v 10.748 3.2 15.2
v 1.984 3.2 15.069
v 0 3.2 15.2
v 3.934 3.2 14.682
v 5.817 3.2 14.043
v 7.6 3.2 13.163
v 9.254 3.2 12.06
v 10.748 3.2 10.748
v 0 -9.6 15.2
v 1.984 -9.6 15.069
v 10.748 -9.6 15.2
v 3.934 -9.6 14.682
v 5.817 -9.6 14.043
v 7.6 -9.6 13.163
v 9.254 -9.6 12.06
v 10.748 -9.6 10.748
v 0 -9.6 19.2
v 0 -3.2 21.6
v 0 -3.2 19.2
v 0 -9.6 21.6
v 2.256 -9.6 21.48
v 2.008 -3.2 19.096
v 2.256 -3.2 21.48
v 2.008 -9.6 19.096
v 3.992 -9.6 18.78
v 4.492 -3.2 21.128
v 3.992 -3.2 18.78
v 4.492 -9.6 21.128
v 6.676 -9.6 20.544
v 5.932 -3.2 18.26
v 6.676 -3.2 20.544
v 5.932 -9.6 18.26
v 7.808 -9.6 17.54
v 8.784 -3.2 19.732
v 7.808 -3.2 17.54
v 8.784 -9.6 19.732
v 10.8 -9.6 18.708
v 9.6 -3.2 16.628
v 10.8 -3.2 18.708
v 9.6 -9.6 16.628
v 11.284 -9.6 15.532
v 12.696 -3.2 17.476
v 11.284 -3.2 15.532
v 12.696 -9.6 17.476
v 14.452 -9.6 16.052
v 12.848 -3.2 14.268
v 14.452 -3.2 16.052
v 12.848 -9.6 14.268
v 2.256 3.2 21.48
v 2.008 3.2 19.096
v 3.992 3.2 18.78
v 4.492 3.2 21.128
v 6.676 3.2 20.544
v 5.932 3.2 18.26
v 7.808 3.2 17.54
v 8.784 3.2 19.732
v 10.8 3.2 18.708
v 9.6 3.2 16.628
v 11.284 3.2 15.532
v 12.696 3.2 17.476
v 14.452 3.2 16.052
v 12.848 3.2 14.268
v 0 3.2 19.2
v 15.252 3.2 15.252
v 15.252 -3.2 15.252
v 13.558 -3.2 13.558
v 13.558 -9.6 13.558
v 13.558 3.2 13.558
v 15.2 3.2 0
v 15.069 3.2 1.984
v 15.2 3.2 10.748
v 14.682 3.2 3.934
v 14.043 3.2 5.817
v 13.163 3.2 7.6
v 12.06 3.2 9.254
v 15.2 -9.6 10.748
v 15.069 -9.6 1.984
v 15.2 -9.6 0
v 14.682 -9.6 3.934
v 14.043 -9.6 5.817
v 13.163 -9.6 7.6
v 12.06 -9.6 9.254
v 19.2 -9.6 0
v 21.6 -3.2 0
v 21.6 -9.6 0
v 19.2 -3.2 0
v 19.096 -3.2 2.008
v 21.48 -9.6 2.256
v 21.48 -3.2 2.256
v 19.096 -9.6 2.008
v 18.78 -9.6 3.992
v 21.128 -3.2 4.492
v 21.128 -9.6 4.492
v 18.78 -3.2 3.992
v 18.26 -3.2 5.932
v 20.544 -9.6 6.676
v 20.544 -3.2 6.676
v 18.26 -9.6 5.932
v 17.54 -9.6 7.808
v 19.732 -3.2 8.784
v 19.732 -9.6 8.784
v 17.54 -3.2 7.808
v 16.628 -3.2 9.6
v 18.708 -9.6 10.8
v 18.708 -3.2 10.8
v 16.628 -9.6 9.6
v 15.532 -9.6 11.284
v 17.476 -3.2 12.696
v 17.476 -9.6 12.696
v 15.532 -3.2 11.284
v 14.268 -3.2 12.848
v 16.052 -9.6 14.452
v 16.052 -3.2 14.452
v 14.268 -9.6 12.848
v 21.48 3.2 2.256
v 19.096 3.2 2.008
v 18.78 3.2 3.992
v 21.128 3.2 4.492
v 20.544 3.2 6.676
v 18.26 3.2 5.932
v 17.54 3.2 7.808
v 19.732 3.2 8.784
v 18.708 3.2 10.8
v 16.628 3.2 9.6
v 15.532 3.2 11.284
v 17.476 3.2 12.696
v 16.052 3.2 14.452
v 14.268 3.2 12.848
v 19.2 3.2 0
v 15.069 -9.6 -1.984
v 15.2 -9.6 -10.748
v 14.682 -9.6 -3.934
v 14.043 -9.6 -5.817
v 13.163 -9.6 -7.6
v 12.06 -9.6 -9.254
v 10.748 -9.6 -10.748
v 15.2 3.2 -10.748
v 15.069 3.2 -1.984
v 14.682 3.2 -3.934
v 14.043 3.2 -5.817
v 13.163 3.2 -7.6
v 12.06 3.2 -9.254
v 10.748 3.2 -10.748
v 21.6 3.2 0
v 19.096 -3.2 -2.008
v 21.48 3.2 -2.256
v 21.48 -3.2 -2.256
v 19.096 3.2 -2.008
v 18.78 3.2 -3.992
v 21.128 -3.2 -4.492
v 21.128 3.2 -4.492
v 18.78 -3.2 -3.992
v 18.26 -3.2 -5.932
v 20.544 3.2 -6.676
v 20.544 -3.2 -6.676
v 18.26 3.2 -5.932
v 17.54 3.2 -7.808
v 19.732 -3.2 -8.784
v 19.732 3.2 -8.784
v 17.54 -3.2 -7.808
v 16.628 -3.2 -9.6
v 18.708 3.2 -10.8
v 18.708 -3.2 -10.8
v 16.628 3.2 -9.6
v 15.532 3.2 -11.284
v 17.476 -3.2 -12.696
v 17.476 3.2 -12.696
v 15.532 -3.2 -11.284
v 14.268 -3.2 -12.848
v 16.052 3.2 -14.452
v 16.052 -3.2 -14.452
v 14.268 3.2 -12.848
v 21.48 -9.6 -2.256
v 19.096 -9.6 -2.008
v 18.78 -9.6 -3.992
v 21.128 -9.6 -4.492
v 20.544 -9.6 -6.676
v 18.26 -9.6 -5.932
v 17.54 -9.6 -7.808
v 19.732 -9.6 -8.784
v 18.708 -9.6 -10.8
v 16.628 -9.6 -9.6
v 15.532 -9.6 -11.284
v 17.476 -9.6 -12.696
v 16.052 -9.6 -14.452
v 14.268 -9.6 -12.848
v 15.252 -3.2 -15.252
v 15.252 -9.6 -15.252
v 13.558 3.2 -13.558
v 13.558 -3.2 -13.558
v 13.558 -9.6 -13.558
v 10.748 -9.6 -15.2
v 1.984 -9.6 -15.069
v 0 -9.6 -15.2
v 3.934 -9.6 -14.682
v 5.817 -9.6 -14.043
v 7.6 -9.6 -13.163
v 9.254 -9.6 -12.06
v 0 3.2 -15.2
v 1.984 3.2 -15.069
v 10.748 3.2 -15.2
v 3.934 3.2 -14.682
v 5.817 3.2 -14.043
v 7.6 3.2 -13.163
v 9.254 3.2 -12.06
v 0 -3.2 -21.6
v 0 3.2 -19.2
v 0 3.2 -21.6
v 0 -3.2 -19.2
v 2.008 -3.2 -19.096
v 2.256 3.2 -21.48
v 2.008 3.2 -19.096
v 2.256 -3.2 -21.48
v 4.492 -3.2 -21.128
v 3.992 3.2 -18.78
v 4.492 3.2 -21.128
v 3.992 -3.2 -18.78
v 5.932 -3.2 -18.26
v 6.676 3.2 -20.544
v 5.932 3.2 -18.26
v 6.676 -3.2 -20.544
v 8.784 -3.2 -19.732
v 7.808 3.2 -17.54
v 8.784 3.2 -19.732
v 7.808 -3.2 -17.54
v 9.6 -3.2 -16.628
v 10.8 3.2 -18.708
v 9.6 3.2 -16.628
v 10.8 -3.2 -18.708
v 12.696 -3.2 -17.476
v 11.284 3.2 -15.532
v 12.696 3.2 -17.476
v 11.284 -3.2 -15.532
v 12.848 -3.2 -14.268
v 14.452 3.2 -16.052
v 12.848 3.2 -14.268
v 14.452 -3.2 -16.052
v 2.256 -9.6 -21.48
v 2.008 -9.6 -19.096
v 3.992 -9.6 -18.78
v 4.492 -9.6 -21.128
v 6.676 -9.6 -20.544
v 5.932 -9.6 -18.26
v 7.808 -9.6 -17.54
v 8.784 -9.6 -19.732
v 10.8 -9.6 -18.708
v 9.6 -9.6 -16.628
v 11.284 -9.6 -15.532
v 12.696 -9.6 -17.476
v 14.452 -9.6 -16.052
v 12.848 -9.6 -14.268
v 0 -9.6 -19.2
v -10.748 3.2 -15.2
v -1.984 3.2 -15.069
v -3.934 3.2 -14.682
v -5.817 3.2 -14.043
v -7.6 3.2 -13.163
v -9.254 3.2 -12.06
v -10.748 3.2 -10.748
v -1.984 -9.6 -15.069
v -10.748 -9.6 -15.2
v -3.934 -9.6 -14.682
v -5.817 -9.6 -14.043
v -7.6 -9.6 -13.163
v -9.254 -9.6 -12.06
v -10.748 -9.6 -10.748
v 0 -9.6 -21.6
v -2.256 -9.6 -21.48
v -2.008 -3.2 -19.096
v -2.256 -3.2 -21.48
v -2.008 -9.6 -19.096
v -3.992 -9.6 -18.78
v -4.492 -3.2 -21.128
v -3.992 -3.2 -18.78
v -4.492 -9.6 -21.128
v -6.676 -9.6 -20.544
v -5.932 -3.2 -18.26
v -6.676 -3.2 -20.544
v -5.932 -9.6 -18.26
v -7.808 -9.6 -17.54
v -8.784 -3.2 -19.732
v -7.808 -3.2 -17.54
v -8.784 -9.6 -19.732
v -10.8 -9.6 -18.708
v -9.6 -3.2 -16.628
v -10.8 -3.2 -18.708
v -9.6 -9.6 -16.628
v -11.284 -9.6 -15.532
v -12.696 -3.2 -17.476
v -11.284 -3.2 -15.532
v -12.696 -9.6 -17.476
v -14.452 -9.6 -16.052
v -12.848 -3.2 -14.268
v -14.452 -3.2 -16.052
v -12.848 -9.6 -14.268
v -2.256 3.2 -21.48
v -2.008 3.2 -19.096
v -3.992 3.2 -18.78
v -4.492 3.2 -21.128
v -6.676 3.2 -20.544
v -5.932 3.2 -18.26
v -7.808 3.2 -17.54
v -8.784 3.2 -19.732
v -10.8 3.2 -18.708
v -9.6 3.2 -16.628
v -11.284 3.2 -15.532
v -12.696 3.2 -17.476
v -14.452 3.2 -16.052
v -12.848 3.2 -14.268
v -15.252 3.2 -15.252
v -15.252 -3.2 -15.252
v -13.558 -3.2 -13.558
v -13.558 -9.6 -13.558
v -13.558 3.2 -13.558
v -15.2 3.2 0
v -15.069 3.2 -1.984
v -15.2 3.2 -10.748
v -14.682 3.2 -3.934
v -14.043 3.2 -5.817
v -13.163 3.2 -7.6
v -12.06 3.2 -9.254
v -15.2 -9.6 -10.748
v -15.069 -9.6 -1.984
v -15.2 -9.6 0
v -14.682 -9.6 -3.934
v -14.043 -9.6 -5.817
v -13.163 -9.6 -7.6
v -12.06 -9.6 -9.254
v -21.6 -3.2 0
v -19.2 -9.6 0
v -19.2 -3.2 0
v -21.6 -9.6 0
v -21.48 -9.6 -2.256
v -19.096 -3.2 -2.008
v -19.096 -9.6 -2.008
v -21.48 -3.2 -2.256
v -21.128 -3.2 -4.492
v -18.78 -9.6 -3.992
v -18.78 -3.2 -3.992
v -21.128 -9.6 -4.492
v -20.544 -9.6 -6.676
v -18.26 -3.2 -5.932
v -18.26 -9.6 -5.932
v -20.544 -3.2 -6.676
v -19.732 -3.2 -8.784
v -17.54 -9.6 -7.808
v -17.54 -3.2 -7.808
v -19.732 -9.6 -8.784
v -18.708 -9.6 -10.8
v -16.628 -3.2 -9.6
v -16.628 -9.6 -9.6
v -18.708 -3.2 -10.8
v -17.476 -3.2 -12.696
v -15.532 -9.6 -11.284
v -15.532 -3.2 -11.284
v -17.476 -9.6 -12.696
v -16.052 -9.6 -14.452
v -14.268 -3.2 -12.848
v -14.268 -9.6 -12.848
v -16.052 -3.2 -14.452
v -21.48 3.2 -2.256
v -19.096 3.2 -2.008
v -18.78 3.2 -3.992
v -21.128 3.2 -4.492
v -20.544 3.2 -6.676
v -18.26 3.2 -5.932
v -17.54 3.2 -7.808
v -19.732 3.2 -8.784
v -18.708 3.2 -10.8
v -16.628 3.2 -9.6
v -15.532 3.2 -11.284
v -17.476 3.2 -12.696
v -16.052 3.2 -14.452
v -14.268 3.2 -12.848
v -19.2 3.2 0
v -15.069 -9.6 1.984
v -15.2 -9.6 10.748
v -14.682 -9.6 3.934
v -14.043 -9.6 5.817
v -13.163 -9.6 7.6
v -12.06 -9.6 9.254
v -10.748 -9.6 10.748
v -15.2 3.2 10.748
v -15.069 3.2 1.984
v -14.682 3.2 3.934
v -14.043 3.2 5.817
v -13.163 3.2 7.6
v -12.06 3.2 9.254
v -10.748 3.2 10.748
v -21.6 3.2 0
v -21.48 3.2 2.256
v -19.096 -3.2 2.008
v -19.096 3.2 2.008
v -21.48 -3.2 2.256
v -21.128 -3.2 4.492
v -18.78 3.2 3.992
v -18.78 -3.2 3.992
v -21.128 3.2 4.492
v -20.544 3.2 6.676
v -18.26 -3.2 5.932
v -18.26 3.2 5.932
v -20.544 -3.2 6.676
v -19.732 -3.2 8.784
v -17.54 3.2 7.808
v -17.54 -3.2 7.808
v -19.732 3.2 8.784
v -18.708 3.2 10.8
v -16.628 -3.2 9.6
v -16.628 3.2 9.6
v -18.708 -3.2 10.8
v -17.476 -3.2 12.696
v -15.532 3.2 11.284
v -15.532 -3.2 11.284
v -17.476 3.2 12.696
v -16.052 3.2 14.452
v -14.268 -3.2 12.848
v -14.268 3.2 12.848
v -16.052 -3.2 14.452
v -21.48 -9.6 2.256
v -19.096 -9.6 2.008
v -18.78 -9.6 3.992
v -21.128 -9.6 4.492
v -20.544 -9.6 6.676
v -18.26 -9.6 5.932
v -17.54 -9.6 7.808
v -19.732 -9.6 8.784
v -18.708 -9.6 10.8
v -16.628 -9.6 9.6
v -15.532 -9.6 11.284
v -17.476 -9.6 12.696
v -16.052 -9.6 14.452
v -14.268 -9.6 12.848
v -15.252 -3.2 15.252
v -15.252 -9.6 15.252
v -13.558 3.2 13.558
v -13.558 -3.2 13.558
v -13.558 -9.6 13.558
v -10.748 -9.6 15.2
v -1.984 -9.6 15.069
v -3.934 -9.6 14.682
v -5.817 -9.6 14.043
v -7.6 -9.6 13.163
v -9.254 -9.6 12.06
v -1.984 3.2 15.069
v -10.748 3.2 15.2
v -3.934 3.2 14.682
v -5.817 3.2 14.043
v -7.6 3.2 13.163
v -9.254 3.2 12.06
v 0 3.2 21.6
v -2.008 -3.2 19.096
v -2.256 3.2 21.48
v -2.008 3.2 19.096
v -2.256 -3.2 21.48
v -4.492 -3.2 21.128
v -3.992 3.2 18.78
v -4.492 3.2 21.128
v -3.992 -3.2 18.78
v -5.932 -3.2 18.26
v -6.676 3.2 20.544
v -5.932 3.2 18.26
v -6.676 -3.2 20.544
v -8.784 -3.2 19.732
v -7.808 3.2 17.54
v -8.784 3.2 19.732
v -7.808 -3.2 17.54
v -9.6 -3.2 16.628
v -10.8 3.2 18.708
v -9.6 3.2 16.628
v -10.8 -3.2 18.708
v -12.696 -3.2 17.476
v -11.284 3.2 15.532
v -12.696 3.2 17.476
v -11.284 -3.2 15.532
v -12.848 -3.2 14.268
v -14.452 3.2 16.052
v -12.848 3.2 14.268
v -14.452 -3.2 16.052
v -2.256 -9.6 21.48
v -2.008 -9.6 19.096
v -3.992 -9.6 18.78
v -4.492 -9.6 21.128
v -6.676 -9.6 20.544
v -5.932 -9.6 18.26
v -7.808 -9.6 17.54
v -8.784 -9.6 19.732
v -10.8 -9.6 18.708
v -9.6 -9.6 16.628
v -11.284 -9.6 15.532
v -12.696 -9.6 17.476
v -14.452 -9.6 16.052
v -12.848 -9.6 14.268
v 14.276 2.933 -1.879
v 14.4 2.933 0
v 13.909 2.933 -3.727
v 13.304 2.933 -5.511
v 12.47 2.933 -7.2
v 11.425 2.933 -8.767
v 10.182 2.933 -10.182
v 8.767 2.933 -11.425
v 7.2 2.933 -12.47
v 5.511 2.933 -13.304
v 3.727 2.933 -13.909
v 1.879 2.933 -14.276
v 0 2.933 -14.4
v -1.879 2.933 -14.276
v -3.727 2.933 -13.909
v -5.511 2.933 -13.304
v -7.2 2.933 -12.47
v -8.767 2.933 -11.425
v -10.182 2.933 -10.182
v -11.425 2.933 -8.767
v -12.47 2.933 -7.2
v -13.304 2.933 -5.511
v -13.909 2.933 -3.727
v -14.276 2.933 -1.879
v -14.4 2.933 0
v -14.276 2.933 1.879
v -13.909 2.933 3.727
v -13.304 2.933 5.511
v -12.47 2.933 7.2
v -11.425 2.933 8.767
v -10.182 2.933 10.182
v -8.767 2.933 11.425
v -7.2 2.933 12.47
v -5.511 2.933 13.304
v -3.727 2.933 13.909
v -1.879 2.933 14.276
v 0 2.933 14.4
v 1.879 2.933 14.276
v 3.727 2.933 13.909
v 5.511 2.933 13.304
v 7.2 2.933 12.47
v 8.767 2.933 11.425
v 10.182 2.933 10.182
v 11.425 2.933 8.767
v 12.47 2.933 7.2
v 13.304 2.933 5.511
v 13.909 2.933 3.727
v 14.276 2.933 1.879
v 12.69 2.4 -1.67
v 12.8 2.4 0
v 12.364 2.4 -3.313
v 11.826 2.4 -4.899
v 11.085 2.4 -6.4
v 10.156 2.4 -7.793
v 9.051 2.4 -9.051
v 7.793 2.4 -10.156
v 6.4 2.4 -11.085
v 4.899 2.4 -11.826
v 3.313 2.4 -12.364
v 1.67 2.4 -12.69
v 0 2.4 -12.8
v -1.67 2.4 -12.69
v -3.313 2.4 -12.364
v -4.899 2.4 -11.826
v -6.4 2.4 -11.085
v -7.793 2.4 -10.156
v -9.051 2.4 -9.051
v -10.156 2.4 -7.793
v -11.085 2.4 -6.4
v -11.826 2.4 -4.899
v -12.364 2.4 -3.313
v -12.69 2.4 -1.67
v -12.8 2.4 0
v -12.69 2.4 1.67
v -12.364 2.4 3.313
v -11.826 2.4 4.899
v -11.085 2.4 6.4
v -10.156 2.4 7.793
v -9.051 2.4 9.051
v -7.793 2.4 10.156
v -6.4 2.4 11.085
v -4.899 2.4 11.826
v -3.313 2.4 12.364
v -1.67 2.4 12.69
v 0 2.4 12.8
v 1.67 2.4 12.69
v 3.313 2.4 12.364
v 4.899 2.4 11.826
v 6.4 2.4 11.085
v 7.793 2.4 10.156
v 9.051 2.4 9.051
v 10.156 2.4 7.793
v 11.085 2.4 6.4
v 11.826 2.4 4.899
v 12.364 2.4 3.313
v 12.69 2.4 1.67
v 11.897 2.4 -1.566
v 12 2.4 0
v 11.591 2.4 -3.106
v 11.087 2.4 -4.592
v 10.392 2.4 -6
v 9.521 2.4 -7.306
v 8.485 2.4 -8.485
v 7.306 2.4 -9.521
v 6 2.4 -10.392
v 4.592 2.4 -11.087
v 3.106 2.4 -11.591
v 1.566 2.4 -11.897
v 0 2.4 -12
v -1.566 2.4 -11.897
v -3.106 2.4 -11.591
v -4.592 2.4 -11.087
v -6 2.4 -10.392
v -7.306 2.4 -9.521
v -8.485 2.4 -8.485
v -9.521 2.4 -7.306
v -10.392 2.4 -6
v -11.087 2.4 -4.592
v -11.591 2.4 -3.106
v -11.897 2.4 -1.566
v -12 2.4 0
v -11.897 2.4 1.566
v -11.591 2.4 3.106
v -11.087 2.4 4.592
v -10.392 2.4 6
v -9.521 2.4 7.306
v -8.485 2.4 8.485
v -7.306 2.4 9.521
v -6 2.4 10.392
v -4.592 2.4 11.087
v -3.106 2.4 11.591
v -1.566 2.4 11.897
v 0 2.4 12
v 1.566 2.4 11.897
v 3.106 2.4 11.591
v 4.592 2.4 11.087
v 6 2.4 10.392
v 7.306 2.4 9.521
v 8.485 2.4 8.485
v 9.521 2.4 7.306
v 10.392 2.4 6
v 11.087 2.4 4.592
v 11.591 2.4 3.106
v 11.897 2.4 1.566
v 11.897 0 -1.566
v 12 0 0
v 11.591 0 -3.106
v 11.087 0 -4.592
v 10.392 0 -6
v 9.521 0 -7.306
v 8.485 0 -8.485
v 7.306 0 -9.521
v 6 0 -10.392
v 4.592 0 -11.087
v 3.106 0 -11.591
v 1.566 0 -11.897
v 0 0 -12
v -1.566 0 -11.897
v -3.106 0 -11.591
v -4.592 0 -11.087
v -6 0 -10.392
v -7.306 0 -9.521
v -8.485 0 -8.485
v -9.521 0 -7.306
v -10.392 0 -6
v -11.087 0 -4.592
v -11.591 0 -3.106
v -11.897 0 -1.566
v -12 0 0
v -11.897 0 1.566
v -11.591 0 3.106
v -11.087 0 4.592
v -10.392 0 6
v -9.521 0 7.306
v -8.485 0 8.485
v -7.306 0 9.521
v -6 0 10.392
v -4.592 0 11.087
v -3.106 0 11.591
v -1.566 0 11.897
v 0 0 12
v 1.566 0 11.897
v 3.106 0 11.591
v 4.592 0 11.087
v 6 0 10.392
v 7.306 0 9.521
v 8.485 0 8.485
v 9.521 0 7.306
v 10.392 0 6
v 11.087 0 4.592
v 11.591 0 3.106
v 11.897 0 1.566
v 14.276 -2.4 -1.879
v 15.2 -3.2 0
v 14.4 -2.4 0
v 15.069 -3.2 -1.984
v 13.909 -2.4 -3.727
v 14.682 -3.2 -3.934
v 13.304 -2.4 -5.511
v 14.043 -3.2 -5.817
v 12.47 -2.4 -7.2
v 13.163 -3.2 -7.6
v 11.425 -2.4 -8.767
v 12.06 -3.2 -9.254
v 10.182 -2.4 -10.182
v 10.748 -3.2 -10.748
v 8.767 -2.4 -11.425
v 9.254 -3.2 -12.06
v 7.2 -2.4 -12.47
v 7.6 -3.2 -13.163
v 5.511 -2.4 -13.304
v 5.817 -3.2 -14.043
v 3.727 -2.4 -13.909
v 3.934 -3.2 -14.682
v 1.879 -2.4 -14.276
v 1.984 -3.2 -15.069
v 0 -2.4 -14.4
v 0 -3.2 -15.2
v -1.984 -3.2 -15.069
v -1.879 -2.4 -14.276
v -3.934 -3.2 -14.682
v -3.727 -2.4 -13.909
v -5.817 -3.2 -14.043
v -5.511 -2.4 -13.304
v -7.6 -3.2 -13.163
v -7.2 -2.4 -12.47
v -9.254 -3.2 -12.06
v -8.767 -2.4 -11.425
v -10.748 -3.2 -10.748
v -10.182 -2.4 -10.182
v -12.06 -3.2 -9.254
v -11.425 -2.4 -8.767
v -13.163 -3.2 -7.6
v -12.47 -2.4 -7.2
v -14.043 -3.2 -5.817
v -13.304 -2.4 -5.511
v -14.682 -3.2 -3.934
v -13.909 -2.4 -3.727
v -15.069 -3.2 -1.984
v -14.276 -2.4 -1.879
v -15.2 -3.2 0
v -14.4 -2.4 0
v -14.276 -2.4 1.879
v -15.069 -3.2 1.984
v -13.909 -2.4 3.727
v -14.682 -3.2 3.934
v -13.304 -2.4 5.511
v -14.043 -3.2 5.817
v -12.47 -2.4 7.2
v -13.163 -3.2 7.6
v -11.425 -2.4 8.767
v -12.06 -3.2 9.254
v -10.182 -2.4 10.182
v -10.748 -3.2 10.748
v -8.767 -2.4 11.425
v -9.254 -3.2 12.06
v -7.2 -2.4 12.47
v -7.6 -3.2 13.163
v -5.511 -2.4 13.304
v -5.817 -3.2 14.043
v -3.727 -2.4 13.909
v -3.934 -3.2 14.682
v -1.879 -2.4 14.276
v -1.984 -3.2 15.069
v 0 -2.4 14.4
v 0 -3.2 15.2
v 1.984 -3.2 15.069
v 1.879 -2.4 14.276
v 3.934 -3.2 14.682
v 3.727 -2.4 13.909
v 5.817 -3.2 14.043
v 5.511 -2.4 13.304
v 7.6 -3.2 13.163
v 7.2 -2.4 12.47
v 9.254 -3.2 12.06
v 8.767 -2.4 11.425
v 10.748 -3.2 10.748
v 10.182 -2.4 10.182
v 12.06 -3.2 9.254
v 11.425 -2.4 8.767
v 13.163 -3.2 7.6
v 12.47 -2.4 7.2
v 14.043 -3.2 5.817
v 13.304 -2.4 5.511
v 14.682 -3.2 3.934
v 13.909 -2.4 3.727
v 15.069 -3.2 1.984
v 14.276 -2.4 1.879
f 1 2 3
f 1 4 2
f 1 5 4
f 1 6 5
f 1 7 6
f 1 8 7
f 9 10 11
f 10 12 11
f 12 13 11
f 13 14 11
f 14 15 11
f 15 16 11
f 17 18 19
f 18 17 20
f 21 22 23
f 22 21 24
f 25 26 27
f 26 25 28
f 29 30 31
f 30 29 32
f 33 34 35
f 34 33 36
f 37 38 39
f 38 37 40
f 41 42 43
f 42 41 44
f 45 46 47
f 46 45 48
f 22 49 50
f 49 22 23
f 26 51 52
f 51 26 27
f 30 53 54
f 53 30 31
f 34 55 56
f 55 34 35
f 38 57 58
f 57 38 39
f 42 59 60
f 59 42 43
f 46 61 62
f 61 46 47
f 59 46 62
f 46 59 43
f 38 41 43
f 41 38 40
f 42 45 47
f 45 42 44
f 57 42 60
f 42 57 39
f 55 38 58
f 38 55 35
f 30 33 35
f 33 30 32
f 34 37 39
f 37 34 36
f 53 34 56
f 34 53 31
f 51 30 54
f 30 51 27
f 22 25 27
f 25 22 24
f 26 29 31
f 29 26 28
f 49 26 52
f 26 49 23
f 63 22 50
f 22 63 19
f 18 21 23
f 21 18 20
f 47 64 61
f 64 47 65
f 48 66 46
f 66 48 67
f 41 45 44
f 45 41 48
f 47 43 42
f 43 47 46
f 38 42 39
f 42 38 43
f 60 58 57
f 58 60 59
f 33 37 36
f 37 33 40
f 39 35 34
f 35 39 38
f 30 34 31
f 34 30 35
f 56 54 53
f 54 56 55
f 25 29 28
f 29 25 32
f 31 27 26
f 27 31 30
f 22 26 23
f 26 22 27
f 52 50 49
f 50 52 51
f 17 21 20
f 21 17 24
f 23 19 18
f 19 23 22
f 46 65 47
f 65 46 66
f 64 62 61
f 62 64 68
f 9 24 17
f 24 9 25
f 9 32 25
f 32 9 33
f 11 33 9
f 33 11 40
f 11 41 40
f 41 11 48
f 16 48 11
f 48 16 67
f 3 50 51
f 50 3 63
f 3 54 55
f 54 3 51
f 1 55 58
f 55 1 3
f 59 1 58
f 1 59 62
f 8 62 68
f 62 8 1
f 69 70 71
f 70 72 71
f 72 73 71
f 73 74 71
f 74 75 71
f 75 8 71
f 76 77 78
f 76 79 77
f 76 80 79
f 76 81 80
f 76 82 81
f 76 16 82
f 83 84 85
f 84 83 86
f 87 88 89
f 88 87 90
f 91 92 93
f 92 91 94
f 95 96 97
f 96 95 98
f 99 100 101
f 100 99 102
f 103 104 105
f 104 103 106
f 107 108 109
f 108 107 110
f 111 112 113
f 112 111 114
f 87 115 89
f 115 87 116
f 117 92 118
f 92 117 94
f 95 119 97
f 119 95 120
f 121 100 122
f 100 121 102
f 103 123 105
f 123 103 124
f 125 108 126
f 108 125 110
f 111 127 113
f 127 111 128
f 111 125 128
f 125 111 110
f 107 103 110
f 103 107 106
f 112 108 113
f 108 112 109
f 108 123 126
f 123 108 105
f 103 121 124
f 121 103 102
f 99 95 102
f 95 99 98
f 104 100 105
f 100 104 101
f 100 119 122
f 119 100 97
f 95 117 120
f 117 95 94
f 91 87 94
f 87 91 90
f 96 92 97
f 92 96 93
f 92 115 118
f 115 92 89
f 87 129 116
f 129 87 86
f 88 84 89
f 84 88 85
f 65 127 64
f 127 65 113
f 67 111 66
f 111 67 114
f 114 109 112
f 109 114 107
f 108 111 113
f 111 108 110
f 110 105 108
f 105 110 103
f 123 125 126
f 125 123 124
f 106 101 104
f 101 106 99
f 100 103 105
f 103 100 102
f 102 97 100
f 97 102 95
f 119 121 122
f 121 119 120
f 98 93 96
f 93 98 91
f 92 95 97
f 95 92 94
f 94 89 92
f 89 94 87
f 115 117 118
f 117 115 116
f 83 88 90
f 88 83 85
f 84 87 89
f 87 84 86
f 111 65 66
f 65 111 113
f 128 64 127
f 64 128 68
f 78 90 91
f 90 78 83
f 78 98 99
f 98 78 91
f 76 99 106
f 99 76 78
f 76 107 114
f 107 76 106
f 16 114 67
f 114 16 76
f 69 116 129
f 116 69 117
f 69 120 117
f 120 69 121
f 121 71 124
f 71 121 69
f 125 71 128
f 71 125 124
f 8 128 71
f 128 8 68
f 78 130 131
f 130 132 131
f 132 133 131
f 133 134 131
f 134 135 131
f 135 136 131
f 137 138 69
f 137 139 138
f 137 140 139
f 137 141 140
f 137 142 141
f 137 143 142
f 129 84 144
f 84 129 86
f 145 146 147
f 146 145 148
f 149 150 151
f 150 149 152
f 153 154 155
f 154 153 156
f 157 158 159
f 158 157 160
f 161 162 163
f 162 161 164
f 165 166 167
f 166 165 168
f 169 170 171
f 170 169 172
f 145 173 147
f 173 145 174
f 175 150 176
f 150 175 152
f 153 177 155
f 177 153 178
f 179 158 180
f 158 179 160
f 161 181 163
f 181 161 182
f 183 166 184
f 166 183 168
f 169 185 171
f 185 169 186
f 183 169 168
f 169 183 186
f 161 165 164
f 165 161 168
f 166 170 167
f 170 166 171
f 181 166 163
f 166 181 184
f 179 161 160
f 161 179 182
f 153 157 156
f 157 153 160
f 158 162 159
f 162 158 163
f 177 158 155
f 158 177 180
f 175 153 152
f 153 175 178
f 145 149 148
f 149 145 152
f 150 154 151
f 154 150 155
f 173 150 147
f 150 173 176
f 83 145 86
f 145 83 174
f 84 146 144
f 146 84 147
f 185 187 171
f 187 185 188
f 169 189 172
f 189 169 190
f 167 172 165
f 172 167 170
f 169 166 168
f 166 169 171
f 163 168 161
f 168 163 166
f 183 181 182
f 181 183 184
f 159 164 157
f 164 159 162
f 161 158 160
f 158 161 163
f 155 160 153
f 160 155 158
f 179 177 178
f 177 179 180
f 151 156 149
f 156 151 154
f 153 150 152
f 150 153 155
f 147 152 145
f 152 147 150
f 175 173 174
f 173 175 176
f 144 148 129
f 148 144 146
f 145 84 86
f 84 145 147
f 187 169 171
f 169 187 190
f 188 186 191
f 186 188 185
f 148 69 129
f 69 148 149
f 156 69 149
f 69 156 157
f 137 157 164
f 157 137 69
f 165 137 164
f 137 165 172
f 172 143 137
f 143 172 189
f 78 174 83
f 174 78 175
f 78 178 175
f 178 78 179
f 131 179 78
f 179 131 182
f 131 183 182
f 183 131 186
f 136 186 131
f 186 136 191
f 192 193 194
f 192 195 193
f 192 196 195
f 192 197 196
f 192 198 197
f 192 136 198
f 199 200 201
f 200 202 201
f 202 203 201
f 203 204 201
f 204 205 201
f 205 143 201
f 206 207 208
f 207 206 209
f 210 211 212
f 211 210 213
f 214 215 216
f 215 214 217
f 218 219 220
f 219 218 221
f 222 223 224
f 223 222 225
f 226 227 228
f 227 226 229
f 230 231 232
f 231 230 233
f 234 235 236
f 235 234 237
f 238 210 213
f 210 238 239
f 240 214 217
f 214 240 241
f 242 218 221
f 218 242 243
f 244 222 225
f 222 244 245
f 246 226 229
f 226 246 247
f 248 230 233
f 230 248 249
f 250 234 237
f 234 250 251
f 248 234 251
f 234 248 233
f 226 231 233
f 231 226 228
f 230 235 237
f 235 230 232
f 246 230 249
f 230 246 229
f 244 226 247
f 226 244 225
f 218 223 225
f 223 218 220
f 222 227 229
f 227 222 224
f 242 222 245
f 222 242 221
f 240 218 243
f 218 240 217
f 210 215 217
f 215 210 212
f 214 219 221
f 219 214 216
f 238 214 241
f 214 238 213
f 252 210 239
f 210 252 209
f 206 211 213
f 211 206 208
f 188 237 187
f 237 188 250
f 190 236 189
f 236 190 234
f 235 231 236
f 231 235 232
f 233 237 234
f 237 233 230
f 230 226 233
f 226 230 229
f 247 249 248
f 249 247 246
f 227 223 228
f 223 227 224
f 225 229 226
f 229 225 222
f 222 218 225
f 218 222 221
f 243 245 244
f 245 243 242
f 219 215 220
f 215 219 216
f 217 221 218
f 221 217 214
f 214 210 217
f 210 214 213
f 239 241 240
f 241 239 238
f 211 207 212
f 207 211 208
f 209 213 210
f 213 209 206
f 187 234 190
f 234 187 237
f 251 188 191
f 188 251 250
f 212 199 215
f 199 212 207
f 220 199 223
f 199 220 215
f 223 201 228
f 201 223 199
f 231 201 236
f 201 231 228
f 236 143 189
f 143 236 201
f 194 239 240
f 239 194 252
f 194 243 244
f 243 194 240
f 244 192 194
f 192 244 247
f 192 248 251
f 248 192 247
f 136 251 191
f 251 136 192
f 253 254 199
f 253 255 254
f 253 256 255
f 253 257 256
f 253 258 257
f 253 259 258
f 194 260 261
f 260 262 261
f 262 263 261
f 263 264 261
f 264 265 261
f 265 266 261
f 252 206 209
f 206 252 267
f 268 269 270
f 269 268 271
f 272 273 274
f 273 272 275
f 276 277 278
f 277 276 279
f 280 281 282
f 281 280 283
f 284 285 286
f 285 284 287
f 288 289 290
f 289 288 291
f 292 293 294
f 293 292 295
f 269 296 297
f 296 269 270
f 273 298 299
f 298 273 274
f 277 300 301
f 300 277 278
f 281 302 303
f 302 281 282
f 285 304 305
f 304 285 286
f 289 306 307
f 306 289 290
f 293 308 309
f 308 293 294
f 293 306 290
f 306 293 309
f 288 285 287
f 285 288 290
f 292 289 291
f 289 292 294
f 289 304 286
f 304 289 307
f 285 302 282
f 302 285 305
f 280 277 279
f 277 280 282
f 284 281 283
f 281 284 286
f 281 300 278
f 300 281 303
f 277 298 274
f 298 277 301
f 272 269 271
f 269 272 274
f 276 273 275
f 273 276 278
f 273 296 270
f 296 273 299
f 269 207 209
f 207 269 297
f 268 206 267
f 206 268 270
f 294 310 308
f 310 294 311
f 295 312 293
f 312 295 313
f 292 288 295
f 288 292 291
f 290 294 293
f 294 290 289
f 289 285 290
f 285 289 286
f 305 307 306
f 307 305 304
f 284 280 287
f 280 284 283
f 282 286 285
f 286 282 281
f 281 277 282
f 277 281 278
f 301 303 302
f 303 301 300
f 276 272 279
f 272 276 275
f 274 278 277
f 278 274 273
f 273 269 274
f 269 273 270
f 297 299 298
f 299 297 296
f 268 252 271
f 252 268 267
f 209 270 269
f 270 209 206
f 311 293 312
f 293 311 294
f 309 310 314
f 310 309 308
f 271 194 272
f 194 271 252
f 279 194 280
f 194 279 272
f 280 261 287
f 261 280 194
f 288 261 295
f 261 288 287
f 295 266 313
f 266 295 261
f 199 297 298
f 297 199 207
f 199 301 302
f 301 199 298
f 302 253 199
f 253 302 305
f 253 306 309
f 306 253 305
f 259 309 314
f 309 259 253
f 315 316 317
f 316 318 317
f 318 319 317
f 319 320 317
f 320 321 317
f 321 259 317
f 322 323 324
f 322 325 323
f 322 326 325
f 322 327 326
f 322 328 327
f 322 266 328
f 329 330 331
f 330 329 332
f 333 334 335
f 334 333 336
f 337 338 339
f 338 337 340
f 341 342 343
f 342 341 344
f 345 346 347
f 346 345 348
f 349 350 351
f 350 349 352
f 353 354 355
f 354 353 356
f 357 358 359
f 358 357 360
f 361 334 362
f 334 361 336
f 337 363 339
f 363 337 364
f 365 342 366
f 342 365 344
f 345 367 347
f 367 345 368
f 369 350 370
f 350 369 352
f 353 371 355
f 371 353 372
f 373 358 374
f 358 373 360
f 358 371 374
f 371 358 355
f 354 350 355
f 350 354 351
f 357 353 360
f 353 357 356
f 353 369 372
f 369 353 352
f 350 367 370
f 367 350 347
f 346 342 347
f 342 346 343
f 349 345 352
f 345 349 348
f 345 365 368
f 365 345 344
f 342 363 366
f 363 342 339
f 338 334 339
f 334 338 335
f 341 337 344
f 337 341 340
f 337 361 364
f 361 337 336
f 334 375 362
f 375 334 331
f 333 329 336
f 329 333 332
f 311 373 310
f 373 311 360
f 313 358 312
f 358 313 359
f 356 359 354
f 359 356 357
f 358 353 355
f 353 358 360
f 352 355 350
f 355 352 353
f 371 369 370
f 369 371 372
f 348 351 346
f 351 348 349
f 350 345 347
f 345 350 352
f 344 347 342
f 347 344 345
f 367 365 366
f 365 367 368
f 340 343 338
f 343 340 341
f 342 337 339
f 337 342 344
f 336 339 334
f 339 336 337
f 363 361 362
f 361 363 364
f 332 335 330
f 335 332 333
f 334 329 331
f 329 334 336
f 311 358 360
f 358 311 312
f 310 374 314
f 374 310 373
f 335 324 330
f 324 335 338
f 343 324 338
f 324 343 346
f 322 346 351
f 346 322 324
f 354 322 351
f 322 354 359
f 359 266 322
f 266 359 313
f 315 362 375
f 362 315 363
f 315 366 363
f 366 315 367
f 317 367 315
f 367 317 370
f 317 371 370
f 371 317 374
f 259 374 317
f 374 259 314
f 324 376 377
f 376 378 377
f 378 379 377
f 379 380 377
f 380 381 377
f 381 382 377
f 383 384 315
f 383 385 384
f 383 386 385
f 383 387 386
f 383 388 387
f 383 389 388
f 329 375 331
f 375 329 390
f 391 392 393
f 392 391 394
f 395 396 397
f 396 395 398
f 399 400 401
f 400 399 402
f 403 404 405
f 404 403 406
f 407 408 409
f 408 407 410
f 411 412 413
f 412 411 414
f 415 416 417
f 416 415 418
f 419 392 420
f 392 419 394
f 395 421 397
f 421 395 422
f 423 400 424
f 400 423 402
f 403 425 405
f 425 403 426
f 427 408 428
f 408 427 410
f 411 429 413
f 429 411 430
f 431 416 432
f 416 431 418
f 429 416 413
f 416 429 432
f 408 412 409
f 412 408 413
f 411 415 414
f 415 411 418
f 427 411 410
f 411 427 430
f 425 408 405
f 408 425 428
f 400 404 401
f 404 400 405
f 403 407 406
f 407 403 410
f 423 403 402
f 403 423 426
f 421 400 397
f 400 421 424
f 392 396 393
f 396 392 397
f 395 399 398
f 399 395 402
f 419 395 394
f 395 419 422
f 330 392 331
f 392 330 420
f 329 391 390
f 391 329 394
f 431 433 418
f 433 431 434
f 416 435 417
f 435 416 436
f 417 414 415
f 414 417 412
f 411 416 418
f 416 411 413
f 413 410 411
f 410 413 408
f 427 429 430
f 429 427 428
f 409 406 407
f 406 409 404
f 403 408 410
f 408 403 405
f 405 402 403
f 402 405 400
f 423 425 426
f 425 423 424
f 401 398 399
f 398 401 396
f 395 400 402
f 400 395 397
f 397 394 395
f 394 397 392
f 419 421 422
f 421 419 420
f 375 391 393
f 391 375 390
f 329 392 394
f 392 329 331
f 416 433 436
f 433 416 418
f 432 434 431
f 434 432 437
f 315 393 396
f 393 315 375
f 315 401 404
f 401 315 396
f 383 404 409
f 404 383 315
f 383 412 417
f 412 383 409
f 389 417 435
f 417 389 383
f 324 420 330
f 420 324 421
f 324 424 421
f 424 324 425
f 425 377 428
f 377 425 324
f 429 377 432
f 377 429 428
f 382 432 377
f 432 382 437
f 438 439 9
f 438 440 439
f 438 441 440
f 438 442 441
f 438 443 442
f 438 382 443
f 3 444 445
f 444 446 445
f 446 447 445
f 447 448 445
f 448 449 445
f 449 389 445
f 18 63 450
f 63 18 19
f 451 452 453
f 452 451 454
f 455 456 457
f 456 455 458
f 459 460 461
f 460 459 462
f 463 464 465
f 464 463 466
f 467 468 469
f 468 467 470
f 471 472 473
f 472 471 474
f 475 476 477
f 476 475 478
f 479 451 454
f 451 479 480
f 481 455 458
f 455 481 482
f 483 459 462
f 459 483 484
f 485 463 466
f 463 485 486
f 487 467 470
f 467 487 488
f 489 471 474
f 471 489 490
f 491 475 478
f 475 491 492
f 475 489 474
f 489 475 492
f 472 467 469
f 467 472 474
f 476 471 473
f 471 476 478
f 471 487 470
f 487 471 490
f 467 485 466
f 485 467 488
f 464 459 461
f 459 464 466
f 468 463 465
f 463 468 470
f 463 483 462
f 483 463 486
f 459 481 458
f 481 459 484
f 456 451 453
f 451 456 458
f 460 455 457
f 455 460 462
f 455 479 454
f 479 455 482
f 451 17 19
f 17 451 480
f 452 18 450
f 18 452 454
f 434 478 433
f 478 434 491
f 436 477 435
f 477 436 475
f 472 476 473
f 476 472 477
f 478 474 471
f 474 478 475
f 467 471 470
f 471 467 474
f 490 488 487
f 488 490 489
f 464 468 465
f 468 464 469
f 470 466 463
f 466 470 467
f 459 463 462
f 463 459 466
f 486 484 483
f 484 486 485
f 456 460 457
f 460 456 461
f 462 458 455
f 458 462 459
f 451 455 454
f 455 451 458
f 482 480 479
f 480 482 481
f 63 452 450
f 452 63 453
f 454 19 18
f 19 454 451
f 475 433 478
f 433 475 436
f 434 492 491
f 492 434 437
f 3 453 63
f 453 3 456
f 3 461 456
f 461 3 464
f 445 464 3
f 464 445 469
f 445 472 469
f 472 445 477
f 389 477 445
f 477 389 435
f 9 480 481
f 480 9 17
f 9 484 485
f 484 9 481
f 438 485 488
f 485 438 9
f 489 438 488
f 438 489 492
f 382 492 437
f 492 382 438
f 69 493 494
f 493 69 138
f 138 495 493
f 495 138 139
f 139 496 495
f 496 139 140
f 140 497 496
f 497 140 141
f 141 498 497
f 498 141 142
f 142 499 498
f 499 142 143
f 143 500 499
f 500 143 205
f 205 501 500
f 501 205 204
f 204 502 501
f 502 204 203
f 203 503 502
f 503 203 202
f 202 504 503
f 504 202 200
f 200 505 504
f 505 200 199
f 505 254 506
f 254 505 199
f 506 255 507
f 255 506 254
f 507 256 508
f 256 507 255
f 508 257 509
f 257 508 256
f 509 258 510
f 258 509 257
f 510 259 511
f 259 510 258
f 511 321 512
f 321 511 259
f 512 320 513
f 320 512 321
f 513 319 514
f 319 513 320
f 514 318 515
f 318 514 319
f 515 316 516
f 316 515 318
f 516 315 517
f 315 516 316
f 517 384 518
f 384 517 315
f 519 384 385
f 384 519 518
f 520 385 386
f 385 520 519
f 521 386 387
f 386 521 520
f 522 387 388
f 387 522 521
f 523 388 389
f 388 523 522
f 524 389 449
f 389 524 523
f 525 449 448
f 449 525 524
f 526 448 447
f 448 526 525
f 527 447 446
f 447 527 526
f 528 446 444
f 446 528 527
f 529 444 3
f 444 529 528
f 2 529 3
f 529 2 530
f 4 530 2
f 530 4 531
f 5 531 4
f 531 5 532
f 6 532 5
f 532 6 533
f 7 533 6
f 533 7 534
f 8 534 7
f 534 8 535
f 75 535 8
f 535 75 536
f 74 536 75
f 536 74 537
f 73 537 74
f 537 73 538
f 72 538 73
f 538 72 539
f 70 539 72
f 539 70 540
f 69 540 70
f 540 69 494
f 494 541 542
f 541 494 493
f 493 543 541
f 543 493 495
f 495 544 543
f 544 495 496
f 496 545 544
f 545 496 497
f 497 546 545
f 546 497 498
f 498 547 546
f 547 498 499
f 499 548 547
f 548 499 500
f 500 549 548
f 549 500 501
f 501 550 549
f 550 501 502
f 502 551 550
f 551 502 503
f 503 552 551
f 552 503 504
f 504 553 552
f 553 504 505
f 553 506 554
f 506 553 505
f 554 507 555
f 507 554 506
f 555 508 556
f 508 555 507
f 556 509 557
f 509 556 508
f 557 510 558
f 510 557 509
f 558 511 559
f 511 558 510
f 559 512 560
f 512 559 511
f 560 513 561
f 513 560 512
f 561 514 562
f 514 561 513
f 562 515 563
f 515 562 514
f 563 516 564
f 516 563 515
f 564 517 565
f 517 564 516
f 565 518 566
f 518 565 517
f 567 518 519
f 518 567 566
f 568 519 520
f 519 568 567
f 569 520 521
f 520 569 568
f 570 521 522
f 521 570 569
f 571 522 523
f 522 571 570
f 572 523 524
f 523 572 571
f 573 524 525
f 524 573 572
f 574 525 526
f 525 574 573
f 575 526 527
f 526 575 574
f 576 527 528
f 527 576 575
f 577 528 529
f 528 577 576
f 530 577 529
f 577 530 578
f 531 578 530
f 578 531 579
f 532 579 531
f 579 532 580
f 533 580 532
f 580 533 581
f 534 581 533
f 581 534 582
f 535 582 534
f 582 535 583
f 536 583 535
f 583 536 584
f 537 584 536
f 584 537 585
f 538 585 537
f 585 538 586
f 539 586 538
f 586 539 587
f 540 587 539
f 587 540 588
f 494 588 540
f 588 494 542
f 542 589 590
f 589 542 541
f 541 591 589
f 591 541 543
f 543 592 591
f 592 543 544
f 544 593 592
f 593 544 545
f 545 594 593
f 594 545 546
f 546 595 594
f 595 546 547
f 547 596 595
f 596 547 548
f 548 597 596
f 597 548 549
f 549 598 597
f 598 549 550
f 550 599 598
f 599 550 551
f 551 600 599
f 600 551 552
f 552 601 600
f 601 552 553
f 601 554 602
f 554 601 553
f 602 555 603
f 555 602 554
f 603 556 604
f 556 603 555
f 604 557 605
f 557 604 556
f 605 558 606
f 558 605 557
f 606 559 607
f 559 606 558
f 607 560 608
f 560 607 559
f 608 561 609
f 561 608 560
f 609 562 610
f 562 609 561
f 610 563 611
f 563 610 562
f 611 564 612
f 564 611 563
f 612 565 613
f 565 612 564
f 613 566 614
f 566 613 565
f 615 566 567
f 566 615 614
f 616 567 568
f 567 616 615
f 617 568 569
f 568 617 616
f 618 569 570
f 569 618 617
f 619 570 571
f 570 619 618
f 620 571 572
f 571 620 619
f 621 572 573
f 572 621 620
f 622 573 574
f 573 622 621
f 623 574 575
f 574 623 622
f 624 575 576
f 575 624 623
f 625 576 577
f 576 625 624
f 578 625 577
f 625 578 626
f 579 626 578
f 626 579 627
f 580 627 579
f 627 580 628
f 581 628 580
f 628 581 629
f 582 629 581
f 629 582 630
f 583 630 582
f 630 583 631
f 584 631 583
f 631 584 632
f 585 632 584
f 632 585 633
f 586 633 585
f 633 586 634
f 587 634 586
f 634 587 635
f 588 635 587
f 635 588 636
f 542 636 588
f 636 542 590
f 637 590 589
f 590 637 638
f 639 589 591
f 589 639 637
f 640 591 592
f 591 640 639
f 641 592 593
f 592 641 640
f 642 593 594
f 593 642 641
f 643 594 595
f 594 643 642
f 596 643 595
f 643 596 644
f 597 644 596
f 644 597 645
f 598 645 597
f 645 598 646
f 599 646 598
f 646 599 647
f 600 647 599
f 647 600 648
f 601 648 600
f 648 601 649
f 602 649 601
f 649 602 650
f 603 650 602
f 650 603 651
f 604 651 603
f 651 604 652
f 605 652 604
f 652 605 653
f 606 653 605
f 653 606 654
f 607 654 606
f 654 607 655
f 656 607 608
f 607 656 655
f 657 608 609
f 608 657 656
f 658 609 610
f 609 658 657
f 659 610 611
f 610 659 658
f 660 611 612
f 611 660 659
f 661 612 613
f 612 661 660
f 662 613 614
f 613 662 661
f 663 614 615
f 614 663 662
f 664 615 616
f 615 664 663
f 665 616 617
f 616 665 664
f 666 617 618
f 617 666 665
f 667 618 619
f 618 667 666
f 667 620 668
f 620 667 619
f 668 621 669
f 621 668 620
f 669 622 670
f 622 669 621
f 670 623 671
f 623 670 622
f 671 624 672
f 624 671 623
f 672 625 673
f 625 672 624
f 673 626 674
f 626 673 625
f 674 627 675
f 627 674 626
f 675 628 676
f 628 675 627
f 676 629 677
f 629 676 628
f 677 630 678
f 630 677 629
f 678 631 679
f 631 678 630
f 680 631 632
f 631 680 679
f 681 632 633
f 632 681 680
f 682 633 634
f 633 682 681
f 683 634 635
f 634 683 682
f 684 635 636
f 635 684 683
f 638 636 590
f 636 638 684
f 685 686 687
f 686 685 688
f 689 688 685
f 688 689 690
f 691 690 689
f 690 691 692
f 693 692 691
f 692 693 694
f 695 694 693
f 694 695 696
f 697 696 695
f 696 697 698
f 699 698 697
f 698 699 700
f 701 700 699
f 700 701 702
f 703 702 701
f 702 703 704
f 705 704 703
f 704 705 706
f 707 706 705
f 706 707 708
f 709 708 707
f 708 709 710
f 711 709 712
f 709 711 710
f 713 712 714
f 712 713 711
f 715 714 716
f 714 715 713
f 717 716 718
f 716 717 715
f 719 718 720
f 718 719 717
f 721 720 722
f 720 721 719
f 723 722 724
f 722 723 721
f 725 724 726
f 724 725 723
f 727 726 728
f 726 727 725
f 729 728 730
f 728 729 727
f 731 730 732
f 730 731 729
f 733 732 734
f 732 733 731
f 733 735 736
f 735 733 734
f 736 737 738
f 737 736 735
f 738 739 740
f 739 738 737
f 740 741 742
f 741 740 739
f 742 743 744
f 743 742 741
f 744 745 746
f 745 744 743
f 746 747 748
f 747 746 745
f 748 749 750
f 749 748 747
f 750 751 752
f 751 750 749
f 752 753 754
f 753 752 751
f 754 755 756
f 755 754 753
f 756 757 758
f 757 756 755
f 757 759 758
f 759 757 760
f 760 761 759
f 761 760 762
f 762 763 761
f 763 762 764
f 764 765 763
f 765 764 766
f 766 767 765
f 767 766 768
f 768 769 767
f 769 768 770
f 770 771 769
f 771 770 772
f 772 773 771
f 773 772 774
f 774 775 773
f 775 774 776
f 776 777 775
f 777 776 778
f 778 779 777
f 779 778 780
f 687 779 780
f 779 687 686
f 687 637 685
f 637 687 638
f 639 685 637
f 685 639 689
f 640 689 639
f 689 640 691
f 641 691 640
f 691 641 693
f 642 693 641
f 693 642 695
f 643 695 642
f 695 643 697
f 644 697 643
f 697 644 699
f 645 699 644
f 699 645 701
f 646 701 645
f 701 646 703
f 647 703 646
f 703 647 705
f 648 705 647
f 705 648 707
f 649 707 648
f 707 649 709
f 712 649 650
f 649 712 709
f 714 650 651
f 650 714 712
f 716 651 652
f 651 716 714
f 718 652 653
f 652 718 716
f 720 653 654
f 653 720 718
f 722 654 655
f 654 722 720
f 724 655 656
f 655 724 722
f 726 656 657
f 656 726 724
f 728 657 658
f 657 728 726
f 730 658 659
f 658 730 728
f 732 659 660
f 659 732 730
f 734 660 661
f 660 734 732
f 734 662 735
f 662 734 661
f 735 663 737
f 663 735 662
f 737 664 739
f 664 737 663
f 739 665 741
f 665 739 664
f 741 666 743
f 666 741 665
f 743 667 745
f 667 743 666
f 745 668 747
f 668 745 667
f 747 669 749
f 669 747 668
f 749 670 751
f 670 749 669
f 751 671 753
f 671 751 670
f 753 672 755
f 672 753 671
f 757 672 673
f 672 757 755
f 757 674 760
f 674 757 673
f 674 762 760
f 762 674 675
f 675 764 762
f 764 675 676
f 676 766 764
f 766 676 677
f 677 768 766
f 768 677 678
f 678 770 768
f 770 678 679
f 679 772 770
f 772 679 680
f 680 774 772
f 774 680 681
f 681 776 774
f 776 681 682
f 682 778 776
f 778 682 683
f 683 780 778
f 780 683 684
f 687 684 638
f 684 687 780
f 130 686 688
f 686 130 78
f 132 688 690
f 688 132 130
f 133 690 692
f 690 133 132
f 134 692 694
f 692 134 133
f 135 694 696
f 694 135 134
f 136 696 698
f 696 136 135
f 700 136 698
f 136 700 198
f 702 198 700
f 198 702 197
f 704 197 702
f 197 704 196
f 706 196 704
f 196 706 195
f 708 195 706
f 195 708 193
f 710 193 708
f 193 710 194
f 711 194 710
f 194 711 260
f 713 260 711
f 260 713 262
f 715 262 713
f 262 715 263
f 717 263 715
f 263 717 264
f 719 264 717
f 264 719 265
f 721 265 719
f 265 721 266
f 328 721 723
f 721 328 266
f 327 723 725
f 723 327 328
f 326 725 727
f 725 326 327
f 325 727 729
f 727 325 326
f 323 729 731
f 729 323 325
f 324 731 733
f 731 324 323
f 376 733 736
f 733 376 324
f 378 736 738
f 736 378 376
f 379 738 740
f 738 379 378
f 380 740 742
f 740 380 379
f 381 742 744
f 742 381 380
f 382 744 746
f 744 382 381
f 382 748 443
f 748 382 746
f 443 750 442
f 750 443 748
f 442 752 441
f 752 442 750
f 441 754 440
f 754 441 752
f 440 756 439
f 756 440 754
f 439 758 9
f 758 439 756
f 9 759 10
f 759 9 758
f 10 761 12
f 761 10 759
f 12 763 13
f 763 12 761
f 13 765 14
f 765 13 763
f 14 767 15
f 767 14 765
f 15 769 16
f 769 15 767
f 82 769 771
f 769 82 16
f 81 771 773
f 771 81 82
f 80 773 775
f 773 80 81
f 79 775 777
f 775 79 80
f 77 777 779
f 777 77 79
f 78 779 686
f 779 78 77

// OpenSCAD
use <../lib.scad>
use <../p/48/4-4con18.scad>
use <../p/48/4-4con5.scad>
use <../p/48/4-4con8.scad>
use <../p/48/4-4cylo.scad>
use <../p/48/4-4edge.scad>
use <../p/48/4-4ring15.scad>
use <s/2696s01.scad>
function ldraw_lib__2696() = [
// 0 Tyre 12.7/ 51 x 30
// 0 Name: 2696.dat
// 0 Author: James Jessiman
// 0 !LDRAW_ORG Part UPDATE 2025-12
// 0 !LICENSE Licensed under CC BY 4.0 : see CAreadme.txt
// 
// 0 BFC CERTIFY CCW
  [0,"BFC","CERTIFY"],
  [0,"BFC","CCW"],
// 
// 0 !KEYWORDS 43.2, Brickowl 564358, Model Team
// 
// 0 !HISTORY 2000-08-01 {Axel Poque} fixes to resolve L3P error messages
// 0 !HISTORY 2000-08-01 {Manfred Moolhuysen} fixes to resolve L3P error messages
// 0 !HISTORY 2000-09-30 [PTadmin] Official Update 2000-02
// 0 !HISTORY 2007-05-18 [PTadmin] Header formatted for Contributor Agreement
// 0 !HISTORY 2008-07-01 [PTadmin] Official Update 2008-01
// 0 !HISTORY 2012-06-29 [cwdee] Update title
// 0 !HISTORY 2012-08-09 [PTadmin] Official Update 2012-02
// 0 !HISTORY 2017-07-21 [MagFors] bfc'd
// 0 !HISTORY 2018-01-30 [PTadmin] Official Update 2018-01
// 0 !HISTORY 2025-03-06 [Blechtaler] with prims and subpart
// 0 !HISTORY 2025-11-30 [OrionP] Official Update 2025-11
// 0 !HISTORY 2025-12-25 [OrionP] Minor header edits
// 0 !HISTORY 2025-12-25 [OrionP] Official Update 2025-12
// 
// 1 16 0 0 0 1 0 0 0 1 0 0 0 1 s\2696s01.dat
  [1,16,0,0,0,1,0,0,0,1,0,0,0,1, ldraw_lib__s__2696s01()],
// 1 16 0 0 0 0 -1 0 -1 0 0 0 0 1 s\2696s01.dat
  [1,16,0,0,0,0,-1,0,-1,0,0,0,0,1, ldraw_lib__s__2696s01()],
// 1 16 0 0 -16 0 -1 0 1 0 0 0 0 -1 s\2696s01.dat
  [1,16,0,0,-16,0,-1,0,1,0,0,0,0,-1, ldraw_lib__s__2696s01()],
// 1 16 0 0 -16 1 0 0 0 -1 0 0 0 -1 s\2696s01.dat
  [1,16,0,0,-16,1,0,0,0,-1,0,0,0,-1, ldraw_lib__s__2696s01()],
// 1 16 0 0 0 -1 0 0 0 -1 0 0 0 1 s\2696s01.dat
  [1,16,0,0,0,-1,0,0,0,-1,0,0,0,1, ldraw_lib__s__2696s01()],
// 1 16 0 0 0 0 1 0 1 0 0 0 0 1 s\2696s01.dat
  [1,16,0,0,0,0,1,0,1,0,0,0,0,1, ldraw_lib__s__2696s01()],
// 1 16 0 0 -16 0 1 0 -1 0 0 0 0 -1 s\2696s01.dat
  [1,16,0,0,-16,0,1,0,-1,0,0,0,0,-1, ldraw_lib__s__2696s01()],
// 1 16 0 0 -16 -1 0 0 0 1 0 0 0 -1 s\2696s01.dat
  [1,16,0,0,-16,-1,0,0,0,1,0,0,0,-1, ldraw_lib__s__2696s01()],
// 2 24 -48 0 -8 -54 0 -8
  [2,24,-48,0,-8,-54,0,-8],
// 2 24 0 48 -8 0 54 -8
  [2,24,0,48,-8,0,54,-8],
// 2 24 48 0 -8 54 0 -8
  [2,24,48,0,-8,54,0,-8],
// 2 24 0 -48 -8 0 -54 -8
  [2,24,0,-48,-8,0,-54,-8],
// 1 16 0 0 8 38 0 0 0 0 38 0 1 0 48\4-4edge.dat
  [1,16,0,0,8,38,0,0,0,0,38,0,1,0, ldraw_lib__48__4_4edge()],
// 0 BFC INVERTNEXT
  [0,"BFC","INVERTNEXT"],
// 1 16 0 0 8 2 0 0 0 0 2 0 -.6666 0 48\4-4con18.dat
  [1,16,0,0,8,2,0,0,0,0,2,0,-.6666,0, ldraw_lib__48__4_4con18()],
// 0 BFC INVERTNEXT
  [0,"BFC","INVERTNEXT"],
// 1 16 0 0 7.3334 4 0 0 0 0 4 0 -1.3334 0 48\4-4con8.dat
  [1,16,0,0,7.3334,4,0,0,0,0,4,0,-1.3334,0, ldraw_lib__48__4_4con8()],
// 1 16 0 0 6 32 0 0 0 0 32 0 1 0 48\4-4edge.dat
  [1,16,0,0,6,32,0,0,0,0,32,0,1,0, ldraw_lib__48__4_4edge()],
// 1 16 0 0 6 2 0 0 0 0 2 0 -2 0 48\4-4ring15.dat
  [1,16,0,0,6,2,0,0,0,0,2,0,-2,0, ldraw_lib__48__4_4ring15()],
// 0 BFC INVERTNEXT
  [0,"BFC","INVERTNEXT"],
// 1 16 0 0 0 30 0 0 0 0 30 0 6 0 48\4-4cylo.dat
  [1,16,0,0,0,30,0,0,0,0,30,0,6,0, ldraw_lib__48__4_4cylo()],
// 0 BFC INVERTNEXT
  [0,"BFC","INVERTNEXT"],
// 1 16 0 0 -8 2 0 0 0 0 2 0 2 0 48\4-4con18.dat
  [1,16,0,0,-8,2,0,0,0,0,2,0,2,0, ldraw_lib__48__4_4con18()],
// 0 BFC INVERTNEXT
  [0,"BFC","INVERTNEXT"],
// 1 16 0 0 -6 6 0 0 0 0 6 0 6 0 48\4-4con5.dat
  [1,16,0,0,-6,6,0,0,0,0,6,0,6,0, ldraw_lib__48__4_4con5()],
// 0 BFC INVERTNEXT
  [0,"BFC","INVERTNEXT"],
// 1 16 0 0 -8 38 0 0 0 0 38 0 -16 0 48\4-4cylo.dat
  [1,16,0,0,-8,38,0,0,0,0,38,0,-16,0, ldraw_lib__48__4_4cylo()],
];
module ldraw_lib__2696(step=0, col=false, unit=2/5, alt=false, line=0.2, solid=!$preview)
    makepoly(ldraw_lib__2696(), step=step, col=col, unit=unit, alt=alt, line=line, solid=solid);
ldraw_lib__2696(line=0.2);
